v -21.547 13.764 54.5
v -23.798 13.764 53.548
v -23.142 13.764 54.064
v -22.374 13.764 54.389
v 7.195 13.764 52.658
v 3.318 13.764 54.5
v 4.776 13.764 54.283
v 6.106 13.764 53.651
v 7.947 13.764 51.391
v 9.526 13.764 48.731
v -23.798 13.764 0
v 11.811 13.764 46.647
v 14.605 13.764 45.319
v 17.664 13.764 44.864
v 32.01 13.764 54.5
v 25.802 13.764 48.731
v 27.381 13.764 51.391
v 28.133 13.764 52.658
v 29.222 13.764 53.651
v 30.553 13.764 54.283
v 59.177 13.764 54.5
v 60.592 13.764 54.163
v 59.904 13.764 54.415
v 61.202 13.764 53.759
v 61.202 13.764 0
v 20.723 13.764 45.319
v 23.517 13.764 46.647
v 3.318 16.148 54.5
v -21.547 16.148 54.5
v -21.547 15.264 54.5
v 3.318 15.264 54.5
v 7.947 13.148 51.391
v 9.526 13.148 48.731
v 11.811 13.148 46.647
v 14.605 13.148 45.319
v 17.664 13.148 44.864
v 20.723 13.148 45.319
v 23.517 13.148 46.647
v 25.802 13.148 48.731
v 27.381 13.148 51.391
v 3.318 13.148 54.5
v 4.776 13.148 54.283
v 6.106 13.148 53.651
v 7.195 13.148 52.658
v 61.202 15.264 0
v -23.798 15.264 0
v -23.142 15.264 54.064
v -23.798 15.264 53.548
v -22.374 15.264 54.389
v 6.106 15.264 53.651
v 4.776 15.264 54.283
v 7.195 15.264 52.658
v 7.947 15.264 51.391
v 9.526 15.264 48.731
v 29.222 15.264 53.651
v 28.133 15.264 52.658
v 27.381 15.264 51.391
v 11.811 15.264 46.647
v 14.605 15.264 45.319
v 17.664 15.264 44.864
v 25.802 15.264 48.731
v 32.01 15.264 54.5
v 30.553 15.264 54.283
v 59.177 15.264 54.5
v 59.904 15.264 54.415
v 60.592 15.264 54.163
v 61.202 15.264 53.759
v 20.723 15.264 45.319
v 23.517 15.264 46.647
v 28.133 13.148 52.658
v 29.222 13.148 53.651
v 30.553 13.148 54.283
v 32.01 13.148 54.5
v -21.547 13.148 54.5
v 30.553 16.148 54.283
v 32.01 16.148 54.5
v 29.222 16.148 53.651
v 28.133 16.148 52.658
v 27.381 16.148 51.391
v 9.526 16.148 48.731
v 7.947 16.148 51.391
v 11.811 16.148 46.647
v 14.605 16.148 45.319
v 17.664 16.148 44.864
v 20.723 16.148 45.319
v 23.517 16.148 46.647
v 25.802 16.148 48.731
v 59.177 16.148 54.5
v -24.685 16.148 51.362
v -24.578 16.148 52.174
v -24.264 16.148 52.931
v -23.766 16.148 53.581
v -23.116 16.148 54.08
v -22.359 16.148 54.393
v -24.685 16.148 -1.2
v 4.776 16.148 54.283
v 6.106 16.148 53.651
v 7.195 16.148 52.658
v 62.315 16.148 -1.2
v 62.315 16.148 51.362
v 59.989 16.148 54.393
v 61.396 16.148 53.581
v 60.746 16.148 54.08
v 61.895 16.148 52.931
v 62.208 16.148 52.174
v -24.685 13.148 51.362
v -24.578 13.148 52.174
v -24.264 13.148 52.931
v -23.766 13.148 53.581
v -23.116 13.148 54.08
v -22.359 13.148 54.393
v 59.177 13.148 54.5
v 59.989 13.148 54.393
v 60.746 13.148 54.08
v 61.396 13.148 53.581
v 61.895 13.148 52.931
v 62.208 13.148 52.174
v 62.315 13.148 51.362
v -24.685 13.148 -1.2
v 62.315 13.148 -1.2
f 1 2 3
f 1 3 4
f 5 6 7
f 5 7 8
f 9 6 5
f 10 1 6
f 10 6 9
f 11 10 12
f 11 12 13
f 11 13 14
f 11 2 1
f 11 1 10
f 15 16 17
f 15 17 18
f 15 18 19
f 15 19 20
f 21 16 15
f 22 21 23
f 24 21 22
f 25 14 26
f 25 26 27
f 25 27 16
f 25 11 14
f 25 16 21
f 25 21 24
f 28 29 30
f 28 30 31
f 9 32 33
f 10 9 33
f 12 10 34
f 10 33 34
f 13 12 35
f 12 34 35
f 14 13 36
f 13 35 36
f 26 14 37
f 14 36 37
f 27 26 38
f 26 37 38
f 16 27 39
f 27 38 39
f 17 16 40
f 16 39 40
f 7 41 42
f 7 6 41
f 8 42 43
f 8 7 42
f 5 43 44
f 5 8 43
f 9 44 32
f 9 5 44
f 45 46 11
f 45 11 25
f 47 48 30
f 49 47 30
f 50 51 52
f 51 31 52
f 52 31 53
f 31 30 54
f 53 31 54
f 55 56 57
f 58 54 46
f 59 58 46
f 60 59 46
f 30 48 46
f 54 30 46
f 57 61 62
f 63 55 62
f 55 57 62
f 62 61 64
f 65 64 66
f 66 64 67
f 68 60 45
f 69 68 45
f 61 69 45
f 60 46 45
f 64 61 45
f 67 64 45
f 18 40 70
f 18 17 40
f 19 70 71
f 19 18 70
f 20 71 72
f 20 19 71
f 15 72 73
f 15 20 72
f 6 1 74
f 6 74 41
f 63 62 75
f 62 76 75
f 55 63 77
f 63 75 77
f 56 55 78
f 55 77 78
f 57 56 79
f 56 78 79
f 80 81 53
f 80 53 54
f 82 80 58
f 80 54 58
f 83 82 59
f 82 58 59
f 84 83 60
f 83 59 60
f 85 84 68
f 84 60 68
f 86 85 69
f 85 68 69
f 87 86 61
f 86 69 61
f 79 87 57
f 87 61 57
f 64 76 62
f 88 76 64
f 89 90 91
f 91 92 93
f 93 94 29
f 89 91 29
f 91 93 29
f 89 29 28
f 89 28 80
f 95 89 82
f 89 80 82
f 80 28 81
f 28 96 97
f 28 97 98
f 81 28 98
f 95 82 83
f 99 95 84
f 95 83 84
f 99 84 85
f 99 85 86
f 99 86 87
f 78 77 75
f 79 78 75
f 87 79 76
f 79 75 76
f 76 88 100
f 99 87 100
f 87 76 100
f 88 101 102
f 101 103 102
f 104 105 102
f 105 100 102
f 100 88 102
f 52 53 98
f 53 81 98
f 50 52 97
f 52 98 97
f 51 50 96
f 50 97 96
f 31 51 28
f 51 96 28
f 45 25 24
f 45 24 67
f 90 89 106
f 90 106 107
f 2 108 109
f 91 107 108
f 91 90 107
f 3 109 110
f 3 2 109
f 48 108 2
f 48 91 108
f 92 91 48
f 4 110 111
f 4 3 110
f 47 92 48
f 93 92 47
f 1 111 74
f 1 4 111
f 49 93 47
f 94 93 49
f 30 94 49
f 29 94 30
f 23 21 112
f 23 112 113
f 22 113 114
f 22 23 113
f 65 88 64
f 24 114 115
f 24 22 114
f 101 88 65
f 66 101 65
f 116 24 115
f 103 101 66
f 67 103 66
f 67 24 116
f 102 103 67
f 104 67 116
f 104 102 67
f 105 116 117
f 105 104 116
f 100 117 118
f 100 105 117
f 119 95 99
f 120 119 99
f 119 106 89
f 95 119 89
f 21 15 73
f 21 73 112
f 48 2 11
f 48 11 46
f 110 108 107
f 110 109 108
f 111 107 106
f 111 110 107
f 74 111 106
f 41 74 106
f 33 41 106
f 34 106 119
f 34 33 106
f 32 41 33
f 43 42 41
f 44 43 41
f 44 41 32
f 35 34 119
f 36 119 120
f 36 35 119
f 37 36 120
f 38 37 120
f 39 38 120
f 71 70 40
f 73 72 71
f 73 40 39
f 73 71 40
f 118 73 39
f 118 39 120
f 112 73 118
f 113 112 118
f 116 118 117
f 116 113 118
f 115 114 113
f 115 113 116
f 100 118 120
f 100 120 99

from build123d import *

# Parameters (mm, degrees)
F0_W        = 87
F0_H        = 3
F0_W_2      = 85
F0_H_2      = 1.5
F1_DEPTH    = 54.5
F3_DEPTH    = 10
F4_T1_DEPTH = 18.6923881554
F5_T1_DEPTH = 18.69
F6_W        = 87
F6_H        = 3
F7_DEPTH    = 1.2
F8_R        = 5


# Not quite as in the source:
# - a fillet or chamfer that OpenCascade refuses, or shapes differently, is made with other operations: its cross-section is extruded or revolved along the edge and cut away or added


with BuildPart() as f1:
    # F0 (on Top) → F1 (new body)
    with BuildSketch(Plane.XY):
        with Locations((18.8151740879, 14.6483827978)):
            Rectangle(F0_W, F0_H)
        with Locations((18.7021535635, 14.5136903673)):
            Rectangle(F0_W_2, F0_H_2, mode=Mode.SUBTRACT)
    extrude(amount=F1_DEPTH)

    # F2 (on face) → F3 (cut)
    with BuildSketch(Plane.XZ.offset(-13.1483827978)):
        with BuildLine():
            Line((28.1252544373, 54.5), (7.2028026916, 54.5))
            ThreePointArc((7.2028026916, 54.5), (17.6640285645, 44.8635037778), (28.1252544373, 54.5))
        make_face()
    extrude(amount=-F3_DEPTH, mode=Mode.SUBTRACT)

    # F4: fillet of radius 3.1384776311 on 1 edges, made by hand

    # F4_s2 → F4_t1 (cut)
    with BuildSketch(Plane.XZ.offset(-23.9945768755)):
        with BuildLine():
            ThreePointArc((59.1766964568, 54.5), (61.3959352723, 53.5807611845), (62.3151740879, 51.3615223689))
            Line((62.3151740879, 51.3615223689), (62.3151740879, 54.5))
            Line((62.3151740879, 54.5), (59.1766964568, 54.5))
        make_face()
    extrude(amount=F4_T1_DEPTH, mode=Mode.SUBTRACT)

    # F5: fillet of radius 3.138 on 1 edges, made by hand

    # F5_s2 → F5_t1 (cut)
    with BuildSketch(Plane.XZ.offset(-23.9933827978)):
        with BuildLine():
            ThreePointArc((-24.6848259121, 51.362), (-23.7657269915, 53.5809010794), (-21.5468259121, 54.5))
            Line((-21.5468259121, 54.5), (-24.6848259121, 54.5))
            Line((-24.6848259121, 54.5), (-24.6848259121, 51.362))
        make_face()
    extrude(amount=F5_T1_DEPTH, mode=Mode.SUBTRACT)

    # F6 (on Top) → F7 (join)
    with BuildSketch(Plane.XY):
        with Locations((18.8151740879, 14.6483827978)):
            Rectangle(F6_W, F6_H)
    extrude(amount=-F7_DEPTH)

    # F8
    f8_edges = [f1.edges().sort_by_distance(p)[0] for p in [
        (28.125254, 13.456037, 54.5),
        (28.125254, 15.706037, 54.5),
        (7.202803, 13.456037, 54.5),
        (7.202803, 15.706037, 54.5),
    ]]
    fillet(f8_edges, radius=F8_R)


solid = f1.part
